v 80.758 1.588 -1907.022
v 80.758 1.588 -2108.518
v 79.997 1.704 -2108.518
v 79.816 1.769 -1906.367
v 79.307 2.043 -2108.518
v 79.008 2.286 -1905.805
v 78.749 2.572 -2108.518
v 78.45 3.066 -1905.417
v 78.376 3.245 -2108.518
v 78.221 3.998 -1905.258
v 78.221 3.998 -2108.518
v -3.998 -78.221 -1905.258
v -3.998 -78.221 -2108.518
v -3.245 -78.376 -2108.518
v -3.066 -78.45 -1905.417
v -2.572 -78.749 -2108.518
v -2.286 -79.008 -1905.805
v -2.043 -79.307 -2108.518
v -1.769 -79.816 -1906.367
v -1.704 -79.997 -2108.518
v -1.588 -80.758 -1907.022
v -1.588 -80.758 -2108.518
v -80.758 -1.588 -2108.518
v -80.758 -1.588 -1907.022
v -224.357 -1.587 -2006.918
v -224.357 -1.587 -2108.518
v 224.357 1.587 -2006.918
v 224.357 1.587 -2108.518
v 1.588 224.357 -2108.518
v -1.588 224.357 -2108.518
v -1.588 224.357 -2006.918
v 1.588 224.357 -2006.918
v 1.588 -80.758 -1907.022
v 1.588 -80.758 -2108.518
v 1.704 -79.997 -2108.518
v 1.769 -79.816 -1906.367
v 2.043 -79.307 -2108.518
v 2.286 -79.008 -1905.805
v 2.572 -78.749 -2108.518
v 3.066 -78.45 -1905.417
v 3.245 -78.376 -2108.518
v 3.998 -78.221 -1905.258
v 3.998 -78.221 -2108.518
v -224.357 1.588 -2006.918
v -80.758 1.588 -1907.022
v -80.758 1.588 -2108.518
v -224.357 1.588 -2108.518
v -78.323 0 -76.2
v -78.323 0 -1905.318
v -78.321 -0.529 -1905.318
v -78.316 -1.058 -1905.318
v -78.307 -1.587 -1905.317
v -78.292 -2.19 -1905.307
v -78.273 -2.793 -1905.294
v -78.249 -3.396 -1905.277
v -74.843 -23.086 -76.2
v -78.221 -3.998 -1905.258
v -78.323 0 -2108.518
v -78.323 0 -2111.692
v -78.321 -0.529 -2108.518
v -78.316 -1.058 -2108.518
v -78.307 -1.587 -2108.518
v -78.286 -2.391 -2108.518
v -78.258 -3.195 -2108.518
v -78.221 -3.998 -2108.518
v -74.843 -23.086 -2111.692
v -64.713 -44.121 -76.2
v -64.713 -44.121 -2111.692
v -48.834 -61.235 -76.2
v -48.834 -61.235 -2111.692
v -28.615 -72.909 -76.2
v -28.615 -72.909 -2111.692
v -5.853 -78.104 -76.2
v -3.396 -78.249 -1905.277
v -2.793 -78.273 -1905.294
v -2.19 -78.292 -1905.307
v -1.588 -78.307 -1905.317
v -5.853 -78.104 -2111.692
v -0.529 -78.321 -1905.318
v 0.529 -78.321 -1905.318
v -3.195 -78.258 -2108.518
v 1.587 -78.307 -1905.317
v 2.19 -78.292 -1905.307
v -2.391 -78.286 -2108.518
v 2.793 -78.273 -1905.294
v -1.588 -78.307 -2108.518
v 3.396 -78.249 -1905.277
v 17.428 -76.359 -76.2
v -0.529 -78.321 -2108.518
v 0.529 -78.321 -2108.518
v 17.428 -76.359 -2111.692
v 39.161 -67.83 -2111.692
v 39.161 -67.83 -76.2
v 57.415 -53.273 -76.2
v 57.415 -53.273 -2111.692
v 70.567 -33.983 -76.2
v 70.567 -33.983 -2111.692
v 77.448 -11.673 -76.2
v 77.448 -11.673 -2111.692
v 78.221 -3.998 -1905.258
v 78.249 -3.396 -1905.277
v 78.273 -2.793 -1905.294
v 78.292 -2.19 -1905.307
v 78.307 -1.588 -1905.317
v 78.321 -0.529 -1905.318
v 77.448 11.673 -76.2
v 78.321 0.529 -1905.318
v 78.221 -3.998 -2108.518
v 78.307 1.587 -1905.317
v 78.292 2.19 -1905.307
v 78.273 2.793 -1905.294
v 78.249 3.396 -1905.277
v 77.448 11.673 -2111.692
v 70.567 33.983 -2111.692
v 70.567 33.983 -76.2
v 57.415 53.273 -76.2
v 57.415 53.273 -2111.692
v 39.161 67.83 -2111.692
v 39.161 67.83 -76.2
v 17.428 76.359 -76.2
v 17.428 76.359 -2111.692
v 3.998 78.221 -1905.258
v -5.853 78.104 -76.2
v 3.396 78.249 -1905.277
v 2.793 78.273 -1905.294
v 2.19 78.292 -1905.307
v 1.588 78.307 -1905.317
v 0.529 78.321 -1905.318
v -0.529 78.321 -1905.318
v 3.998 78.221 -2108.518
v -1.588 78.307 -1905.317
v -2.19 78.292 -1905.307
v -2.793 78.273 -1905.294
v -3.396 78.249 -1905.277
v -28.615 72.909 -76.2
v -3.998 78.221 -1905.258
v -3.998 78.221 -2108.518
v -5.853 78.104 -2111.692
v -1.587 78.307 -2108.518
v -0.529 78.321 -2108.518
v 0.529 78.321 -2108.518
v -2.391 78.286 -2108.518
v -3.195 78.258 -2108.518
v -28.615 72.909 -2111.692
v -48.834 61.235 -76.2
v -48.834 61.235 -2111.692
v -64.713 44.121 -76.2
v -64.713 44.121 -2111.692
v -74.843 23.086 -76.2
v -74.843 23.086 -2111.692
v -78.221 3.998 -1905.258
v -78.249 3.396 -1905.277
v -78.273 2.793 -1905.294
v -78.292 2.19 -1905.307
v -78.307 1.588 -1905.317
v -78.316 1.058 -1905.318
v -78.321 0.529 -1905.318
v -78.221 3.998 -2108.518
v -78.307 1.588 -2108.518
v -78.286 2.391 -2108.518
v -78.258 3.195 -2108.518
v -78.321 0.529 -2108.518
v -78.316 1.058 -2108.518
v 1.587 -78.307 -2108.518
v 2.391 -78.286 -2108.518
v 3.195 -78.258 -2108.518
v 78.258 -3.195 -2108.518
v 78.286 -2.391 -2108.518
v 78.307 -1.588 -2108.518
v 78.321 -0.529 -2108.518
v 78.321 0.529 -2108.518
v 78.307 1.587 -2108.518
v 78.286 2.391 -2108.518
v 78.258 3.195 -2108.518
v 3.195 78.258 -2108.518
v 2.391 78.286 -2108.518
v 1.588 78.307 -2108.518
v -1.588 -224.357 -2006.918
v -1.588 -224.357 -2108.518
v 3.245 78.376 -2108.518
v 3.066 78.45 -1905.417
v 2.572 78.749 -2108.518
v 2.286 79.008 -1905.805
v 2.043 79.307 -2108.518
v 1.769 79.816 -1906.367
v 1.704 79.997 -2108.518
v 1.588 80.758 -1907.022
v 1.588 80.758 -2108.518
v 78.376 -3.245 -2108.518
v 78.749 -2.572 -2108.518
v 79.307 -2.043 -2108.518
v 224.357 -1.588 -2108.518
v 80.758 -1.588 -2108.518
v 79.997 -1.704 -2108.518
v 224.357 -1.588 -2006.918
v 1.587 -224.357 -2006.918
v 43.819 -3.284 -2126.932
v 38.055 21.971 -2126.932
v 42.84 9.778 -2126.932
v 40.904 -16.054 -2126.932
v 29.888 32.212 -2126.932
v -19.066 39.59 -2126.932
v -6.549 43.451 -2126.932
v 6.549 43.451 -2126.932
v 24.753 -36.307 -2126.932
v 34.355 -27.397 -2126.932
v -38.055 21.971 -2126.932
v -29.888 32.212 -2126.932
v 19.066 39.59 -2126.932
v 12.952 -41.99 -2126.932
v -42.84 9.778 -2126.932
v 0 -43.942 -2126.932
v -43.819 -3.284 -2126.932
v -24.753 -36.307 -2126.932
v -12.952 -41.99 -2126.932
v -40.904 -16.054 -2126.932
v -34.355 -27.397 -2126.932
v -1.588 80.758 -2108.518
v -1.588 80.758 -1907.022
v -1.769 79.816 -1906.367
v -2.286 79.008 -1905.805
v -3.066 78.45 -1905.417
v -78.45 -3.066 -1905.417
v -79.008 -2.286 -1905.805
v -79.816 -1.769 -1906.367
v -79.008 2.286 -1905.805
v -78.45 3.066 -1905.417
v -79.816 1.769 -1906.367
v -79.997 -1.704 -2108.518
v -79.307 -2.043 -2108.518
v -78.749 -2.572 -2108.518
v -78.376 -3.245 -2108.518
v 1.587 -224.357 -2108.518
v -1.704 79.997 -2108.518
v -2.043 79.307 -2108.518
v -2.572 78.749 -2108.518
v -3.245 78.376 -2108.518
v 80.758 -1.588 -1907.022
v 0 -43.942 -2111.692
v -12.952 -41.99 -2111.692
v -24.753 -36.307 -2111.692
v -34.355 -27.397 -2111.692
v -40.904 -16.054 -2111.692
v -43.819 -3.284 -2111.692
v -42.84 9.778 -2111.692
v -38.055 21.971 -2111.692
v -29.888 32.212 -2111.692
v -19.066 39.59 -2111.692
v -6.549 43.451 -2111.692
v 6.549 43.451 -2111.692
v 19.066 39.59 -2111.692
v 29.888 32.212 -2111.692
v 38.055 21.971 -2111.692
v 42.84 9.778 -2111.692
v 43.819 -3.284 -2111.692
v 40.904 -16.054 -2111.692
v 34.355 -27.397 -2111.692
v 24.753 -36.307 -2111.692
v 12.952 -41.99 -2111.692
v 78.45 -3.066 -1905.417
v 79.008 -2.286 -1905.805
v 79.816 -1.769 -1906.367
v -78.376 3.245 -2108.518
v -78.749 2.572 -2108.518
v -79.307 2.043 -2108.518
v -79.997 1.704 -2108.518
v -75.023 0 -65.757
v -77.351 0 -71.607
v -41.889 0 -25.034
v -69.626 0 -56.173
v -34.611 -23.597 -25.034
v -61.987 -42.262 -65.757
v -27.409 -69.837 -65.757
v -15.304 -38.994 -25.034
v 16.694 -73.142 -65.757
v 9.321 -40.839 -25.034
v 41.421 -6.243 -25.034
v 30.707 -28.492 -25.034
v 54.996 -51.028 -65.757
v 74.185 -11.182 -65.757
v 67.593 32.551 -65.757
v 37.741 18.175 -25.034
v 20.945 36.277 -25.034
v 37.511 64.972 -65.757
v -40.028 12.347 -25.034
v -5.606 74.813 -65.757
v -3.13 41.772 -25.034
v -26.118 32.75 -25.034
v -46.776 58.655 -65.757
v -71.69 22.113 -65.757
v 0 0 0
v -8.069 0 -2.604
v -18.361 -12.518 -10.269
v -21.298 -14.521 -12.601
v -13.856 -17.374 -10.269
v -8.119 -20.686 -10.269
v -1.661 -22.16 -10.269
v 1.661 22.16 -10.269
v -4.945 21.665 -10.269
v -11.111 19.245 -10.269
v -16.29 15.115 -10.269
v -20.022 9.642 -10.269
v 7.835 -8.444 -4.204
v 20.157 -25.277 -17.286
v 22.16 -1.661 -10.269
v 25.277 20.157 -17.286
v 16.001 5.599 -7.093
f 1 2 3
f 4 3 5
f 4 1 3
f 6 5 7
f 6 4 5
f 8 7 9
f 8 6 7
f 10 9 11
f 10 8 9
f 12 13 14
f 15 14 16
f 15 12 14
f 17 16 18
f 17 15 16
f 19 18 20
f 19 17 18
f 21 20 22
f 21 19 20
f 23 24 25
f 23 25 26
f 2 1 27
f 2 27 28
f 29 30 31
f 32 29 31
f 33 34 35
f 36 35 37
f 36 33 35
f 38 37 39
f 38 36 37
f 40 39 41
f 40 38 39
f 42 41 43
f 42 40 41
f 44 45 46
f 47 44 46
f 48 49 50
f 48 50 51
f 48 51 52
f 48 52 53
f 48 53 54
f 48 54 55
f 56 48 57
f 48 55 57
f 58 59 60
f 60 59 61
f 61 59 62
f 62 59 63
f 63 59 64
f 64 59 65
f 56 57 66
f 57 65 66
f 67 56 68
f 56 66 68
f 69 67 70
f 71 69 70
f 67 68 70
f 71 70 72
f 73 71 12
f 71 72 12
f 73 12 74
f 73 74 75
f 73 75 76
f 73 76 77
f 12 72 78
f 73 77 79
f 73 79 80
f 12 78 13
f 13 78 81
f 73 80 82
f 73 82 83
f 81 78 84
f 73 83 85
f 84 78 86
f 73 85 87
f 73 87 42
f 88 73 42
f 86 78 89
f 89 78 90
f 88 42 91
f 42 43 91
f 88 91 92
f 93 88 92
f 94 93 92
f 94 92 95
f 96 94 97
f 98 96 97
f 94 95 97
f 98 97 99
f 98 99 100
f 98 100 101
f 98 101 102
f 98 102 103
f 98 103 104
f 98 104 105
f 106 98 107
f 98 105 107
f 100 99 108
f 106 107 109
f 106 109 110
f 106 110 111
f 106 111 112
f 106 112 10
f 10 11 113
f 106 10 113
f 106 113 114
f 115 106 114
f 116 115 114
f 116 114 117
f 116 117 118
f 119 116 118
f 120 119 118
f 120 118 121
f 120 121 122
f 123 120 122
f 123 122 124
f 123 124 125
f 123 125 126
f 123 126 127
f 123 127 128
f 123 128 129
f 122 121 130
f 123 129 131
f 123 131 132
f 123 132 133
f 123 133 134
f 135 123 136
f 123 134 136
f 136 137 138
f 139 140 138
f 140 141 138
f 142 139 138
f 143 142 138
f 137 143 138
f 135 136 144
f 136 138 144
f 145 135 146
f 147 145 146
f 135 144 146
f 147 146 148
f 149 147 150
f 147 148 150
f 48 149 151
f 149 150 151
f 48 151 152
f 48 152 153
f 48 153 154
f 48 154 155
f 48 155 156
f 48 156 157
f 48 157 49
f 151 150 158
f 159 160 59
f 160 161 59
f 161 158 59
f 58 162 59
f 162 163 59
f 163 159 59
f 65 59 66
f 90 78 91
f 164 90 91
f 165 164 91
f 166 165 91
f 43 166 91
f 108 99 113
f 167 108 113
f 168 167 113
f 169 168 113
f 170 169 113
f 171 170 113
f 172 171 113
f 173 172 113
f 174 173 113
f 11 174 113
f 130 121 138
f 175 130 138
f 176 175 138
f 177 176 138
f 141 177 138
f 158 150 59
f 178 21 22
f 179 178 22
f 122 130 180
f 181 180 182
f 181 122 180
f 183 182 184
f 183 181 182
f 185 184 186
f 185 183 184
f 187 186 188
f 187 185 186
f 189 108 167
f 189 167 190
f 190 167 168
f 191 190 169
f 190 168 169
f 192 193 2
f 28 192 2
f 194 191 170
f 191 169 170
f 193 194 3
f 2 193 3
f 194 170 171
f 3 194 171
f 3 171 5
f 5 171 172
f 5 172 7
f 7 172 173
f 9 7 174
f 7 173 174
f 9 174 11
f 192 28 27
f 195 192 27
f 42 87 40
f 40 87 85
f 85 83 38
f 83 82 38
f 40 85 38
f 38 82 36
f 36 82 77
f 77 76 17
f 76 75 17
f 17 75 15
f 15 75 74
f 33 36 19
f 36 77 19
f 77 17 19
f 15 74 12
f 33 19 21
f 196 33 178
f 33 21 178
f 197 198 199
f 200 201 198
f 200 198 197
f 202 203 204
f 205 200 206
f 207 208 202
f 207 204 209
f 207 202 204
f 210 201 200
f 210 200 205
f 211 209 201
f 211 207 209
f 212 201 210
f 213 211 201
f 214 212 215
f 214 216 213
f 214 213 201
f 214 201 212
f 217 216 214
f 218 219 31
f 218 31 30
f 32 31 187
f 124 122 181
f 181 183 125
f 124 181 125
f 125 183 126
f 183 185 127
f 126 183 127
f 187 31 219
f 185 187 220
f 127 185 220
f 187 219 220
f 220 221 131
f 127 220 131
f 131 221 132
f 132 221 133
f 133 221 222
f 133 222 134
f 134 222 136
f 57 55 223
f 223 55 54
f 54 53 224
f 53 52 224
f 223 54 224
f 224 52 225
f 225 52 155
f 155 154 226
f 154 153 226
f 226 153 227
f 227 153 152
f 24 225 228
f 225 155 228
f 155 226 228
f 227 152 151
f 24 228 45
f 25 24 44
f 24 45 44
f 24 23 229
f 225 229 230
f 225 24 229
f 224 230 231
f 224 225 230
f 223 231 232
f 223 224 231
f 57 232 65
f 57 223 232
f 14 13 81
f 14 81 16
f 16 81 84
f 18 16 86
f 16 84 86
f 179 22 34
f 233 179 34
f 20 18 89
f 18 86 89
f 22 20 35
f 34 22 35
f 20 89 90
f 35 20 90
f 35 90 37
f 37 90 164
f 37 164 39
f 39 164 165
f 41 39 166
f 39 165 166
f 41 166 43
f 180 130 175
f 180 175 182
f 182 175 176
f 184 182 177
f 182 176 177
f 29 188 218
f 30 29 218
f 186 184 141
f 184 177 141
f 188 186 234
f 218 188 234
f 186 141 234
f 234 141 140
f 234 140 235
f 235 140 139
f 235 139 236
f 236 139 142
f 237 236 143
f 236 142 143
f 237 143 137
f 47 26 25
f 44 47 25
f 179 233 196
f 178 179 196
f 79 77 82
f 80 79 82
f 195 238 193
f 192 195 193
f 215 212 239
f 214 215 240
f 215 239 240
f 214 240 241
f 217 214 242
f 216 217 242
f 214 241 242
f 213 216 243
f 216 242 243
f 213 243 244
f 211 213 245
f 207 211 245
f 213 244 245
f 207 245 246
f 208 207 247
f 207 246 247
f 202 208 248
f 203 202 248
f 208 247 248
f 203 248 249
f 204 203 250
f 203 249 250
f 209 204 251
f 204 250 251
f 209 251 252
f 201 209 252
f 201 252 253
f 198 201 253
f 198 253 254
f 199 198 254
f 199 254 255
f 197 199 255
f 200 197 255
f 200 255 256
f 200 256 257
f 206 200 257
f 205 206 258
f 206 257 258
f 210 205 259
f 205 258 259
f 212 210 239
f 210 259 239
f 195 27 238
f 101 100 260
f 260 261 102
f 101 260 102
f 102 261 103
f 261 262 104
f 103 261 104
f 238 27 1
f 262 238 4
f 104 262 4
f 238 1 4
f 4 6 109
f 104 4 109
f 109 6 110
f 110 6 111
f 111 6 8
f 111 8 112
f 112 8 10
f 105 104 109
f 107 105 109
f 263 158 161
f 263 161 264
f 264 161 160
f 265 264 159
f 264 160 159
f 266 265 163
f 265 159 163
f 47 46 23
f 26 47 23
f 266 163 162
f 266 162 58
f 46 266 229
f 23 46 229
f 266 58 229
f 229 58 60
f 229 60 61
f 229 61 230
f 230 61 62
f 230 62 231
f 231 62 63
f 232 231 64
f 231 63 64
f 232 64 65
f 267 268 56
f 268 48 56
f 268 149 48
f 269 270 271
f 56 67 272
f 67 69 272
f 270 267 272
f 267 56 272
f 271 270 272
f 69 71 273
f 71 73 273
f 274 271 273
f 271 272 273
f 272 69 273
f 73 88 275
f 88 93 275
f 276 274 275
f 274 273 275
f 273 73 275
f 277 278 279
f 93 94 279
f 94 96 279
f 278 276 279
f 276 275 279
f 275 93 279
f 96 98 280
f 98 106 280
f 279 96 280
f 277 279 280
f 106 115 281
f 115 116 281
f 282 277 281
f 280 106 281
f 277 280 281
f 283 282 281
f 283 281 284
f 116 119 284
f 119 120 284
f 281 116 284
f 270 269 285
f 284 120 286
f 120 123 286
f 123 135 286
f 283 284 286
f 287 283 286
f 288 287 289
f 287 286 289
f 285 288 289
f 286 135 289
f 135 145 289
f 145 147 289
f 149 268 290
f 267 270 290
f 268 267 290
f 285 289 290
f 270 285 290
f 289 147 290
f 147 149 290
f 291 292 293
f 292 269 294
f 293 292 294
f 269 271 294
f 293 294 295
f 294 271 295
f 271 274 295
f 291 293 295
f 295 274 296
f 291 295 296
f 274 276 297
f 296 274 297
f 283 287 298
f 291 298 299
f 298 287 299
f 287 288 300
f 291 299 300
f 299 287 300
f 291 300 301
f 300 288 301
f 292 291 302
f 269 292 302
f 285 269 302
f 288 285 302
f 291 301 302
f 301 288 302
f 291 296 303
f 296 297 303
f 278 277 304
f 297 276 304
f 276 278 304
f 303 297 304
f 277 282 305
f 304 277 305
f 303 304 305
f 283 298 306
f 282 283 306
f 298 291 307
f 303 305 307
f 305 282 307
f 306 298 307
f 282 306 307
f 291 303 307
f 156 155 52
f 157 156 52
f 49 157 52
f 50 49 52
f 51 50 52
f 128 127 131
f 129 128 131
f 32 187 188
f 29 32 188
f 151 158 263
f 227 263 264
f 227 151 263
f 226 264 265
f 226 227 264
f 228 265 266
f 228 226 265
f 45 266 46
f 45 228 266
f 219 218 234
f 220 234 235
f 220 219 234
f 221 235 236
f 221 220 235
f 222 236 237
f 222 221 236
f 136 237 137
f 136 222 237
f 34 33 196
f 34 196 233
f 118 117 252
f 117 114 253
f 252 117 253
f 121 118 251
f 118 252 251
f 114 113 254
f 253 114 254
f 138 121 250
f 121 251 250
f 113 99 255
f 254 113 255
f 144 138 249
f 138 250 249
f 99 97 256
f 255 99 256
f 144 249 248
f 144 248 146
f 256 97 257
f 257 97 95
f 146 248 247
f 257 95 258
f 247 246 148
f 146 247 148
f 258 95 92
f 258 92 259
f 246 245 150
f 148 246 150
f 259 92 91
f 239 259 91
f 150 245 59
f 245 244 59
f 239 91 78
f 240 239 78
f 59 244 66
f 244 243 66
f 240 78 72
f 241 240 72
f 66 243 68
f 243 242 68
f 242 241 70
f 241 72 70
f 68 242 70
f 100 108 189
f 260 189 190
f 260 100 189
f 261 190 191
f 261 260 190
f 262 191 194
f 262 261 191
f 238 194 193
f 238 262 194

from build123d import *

# Parameters (mm, degrees)
SKETCH3_R                = 43.942
BOSS_EXTRUDE1_DEPTH      = 15.24
BOSS_EXTRUDE2_REACH      = 2156.162
BOSS_EXTRUDE2_END_RADIUS = 78.322932
SKETCH4_W                = 3.175
SKETCH4_H                = 203.2
CUT_EXTRUDE1_REACH       = 2145.535
FILLET1_R                = 2.54
CIRPATTERN1_COUNT        = 4
FILLET1_OF_CIRPATTERN1_R = 2.54


with BuildPart() as part:
    # Sketch2 → Revolve1 (revolve)
    with BuildSketch(Plane(origin=(0, 0, 0), x_dir=(0, 0, -1), z_dir=(1, 0, 0)), mode=Mode.PRIVATE) as revolve1_sk:
        with BuildLine():
            Line((76.2, 78.322932), (2111.6925, 78.322932))
            Line((2111.6925, 78.322932), (2111.6925, 0))
            Line((2111.6925, 0), (0, 0))
            add(Edge.make_bspline(
                [(0, 0), (0.00157185, 0.031106382), (0.00598179, 0.093218427), (0.019741162, 0.217041654), (0.056245749, 0.471623897), (0.120220676, 0.824555102), (0.289900607, 1.607620967), (0.681695021, 3.044497502), (1.369417811, 5.088592926), (2.663624448, 8.328390532), (4.627219491, 12.504828431), (7.221628503, 17.313832891), (10.478488809, 22.663697626), (14.048468312, 27.97193092), (17.830107282, 33.131203754), (21.803068789, 38.144384751), (25.954684106, 43.010577273), (30.277267993, 47.72553477), (34.76726888, 52.281456881), (39.424593478, 56.666373482), (44.252629149, 60.862995207), (49.25851273, 64.846416869), (54.379271658, 68.526766678), (59.025760285, 71.483086359), (63.137367168, 73.775059871), (66.620488281, 75.459145189), (69.291079417, 76.576884505), (71.652609302, 77.398960624), (73.545502358, 77.917349185), (74.790486934, 78.170322816), (75.589714748, 78.281706661), (75.99027716, 78.31490275), (76.130043485, 78.321823203), (76.2, 78.322932)],
                knots=[0, 0, 0, 0, 0, 0.00110147, 0.00220294, 0.004405879, 0.009096351, 0.013786822, 0.030539543, 0.057061285, 0.08533897, 0.137140357, 0.193696574, 0.250252697, 0.306809175, 0.363365414, 0.419921856, 0.476478205, 0.533034532, 0.589590952, 0.646147292, 0.702703654, 0.75926004, 0.815816409, 0.86911958, 0.89739782, 0.925675959, 0.952619519, 0.971471661, 0.985785918, 0.995050665, 0.997525332, 1, 1, 1, 1, 1], degree=4))
        make_face()
    revolve(revolve1_sk.sketch.rotate(Axis((0, 0, -2111.6925), (0, 0, 1)), 90), axis=Axis((0, 0, -2111.6925), (0, 0, 1)))

    # Sketch3 → Boss-Extrude1 (add)
    with BuildSketch(Plane(origin=(0, 0, -2111.6925), x_dir=(-1, 0, 0), z_dir=(0, 0, -1))):
        with Locations(Location((0, 0, 0), (0, 0, 270))):
            Circle(SKETCH3_R)
    extrude(amount=BOSS_EXTRUDE1_DEPTH)

    # Boss-Extrude2: up to this cylinder (the profile starts outside it)
    boss_extrude2_end = Plane(origin=(0, 0, -2006.9175), z_dir=(0, 0, -1)) * Cylinder(BOSS_EXTRUDE2_END_RADIUS, 4469.969864, mode=Mode.PRIVATE)
    # Sketch4 → Boss-Extrude2 (add, up to the surface)
    with BuildSketch(Plane(origin=(0, 254, 0), x_dir=(1, 0, 0), z_dir=(0, 1, 0)), mode=Mode.PRIVATE) as boss_extrude2_sk1:
        with Locations((0, 2006.9175)):
            Rectangle(SKETCH4_W, SKETCH4_H)
    boss_extrude2_tool1 = extrude(boss_extrude2_sk1.sketch, amount=-BOSS_EXTRUDE2_REACH, mode=Mode.PRIVATE) - boss_extrude2_end
    boss_extrude2 = boss_extrude2_tool1.solids().sort_by_distance((0, 254, -2006.9175))[0]
    add(boss_extrude2)

    # Sketch5 → Cut-Extrude1 (cut, up to next)
    with BuildSketch(Plane.ZY.offset(1.5875), mode=Mode.PRIVATE) as cut_extrude1_sk1:
        Polygon((-2108.5175, 224.356842107), (-2006.9175, 224.356842107), (-1905.3175, 78.306842107), (-1905.3175, 254), (-2108.5175, 254), align=None)
    cut_extrude1_tool1 = extrude(cut_extrude1_sk1.sketch, amount=-CUT_EXTRUDE1_REACH, mode=Mode.PRIVATE) & part.part
    cut_extrude1 = cut_extrude1_tool1.solids().sort_by_distance((-1.5875, 204.128915, -1969.534252))[0]
    add(cut_extrude1, mode=Mode.SUBTRACT)

    # Fillet1
    # the kernel refuses this fillet: 2.54 mm, written as the material it adds along each edge
    with BuildSketch(Plane(origin=(-1.5875, 78.306842107, -1899.190797857), x_dir=(-0.9993639751499004, -0.03566013422001241, 0), z_dir=(0, 0, -1))) as fillet1_piece_1_section:
        with BuildLine():
            CenterArc((2.450992889, 2.539698904), FILLET1_R, 182.043608468, 87.074170625)
            Line((-0.087391608, 2.449122163), (0, 0))
            ThreePointArc((0, 0), (1.205942189, 0.009284527), (2.411884379, 0))
        make_face()
    fillet1_piece_1 = extrude(amount=209.326702143, mode=Mode.PRIVATE)
    fillet1_piece_1 = split(fillet1_piece_1, bisect_by=Plane(origin=(-3.095055571, 78.248638535, -1905.277010558), z_dir=(0, -0.5710644881985995, -0.8209052017854874)), keep=Keep.TOP, mode=Mode.PRIVATE)
    add(fillet1_piece_1)
    with BuildSketch(Plane(origin=(1.5875, 78.306842107, -1899.190797857), x_dir=(0.9993639751499004, -0.035660134220013434, 0), z_dir=(0, 0, -1))) as fillet1_piece_2_section:
        with BuildLine():
            CenterArc((2.450992889, -2.539698904), FILLET1_R, 90.882220907, 87.074170625)
            Line((-0.087391608, -2.449122163), (0, 0))
            ThreePointArc((0, 0), (1.205942189, -0.009284527), (2.411884379, 0))
        make_face()
    fillet1_piece_2 = extrude(amount=209.326702143, mode=Mode.PRIVATE)
    fillet1_piece_2 = split(fillet1_piece_2, bisect_by=Plane(origin=(3.095055571, 78.248638535, -1905.277010558), z_dir=(0, -0.5710644881985995, -0.8209052017854874)), keep=Keep.TOP, mode=Mode.PRIVATE)
    add(fillet1_piece_2)

    # CirPattern1: Boss-Extrude2, Cut-Extrude1 ×4 about axis
    cirpattern1_axis = Axis((0, 0, 0), (0, 0, 1))
    add([boss_extrude2.rotate(cirpattern1_axis, i * 360 / CIRPATTERN1_COUNT) for i in range(1, CIRPATTERN1_COUNT)])
    add([cut_extrude1.rotate(cirpattern1_axis, i * 360 / CIRPATTERN1_COUNT) for i in range(1, CIRPATTERN1_COUNT)], mode=Mode.SUBTRACT)

    # Fillet1 of CirPattern1
    # the kernel refuses this fillet: 2.54 mm, written as the material it adds along each edge
    with BuildSketch(Plane(origin=(-78.306842107, -1.5875, -1899.190797857), x_dir=(0.03566013422001848, -0.9993639751499002, 0), z_dir=(0, 0, -1))) as fillet1_of_cirpattern1_piece_1_section:
        with BuildLine():
            CenterArc((2.450992889, 2.539698904), FILLET1_OF_CIRPATTERN1_R, 182.043608468, 87.074170625)
            Line((-0.087391608, 2.449122163), (0, 0))
            ThreePointArc((0, 0), (1.205942189, 0.009284527), (2.411884379, 0))
        make_face()
    fillet1_of_cirpattern1_piece_1 = extrude(amount=209.326702143, mode=Mode.PRIVATE)
    fillet1_of_cirpattern1_piece_1 = split(fillet1_of_cirpattern1_piece_1, bisect_by=Plane(origin=(-78.248638535, -3.095055571, -1905.277010558), z_dir=(0.5710644881985995, 0, -0.8209052017854874)), keep=Keep.TOP, mode=Mode.PRIVATE)
    add(fillet1_of_cirpattern1_piece_1)
    with BuildSketch(Plane(origin=(-78.306842107, 1.5875, -1899.190797857), x_dir=(0.03566013422001241, 0.9993639751499004, 0), z_dir=(0, 0, -1))) as fillet1_of_cirpattern1_piece_2_section:
        with BuildLine():
            CenterArc((2.450992889, -2.539698904), FILLET1_OF_CIRPATTERN1_R, 90.882220907, 87.074170625)
            Line((-0.087391608, -2.449122163), (0, 0))
            ThreePointArc((0, 0), (1.205942189, -0.009284527), (2.411884379, 0))
        make_face()
    fillet1_of_cirpattern1_piece_2 = extrude(amount=209.326702143, mode=Mode.PRIVATE)
    fillet1_of_cirpattern1_piece_2 = split(fillet1_of_cirpattern1_piece_2, bisect_by=Plane(origin=(-78.248638535, 3.095055571, -1905.277010558), z_dir=(0.5710644881985995, 0, -0.8209052017854874)), keep=Keep.TOP, mode=Mode.PRIVATE)
    add(fillet1_of_cirpattern1_piece_2)
    with BuildSketch(Plane(origin=(1.5875, -78.306842107, -1899.190797857), x_dir=(0.9993639751499002, 0.035660134220018555, 0), z_dir=(0, 0, -1))) as fillet1_of_cirpattern1_piece_3_section:
        with BuildLine():
            CenterArc((2.450992889, 2.539698904), FILLET1_OF_CIRPATTERN1_R, 182.043608468, 87.074170625)
            Line((-0.087391608, 2.449122163), (0, 0))
            ThreePointArc((0, 0), (1.205942189, 0.009284527), (2.411884379, 0))
        make_face()
    fillet1_of_cirpattern1_piece_3 = extrude(amount=209.326702143, mode=Mode.PRIVATE)
    fillet1_of_cirpattern1_piece_3 = split(fillet1_of_cirpattern1_piece_3, bisect_by=Plane(origin=(3.095055571, -78.248638535, -1905.277010558), z_dir=(0, 0.5710644881985995, -0.8209052017854874)), keep=Keep.TOP, mode=Mode.PRIVATE)
    add(fillet1_of_cirpattern1_piece_3)
    with BuildSketch(Plane(origin=(-1.5875, -78.306842107, -1899.190797857), x_dir=(-0.9993639751499004, 0.03566013422001239, 0), z_dir=(0, 0, -1))) as fillet1_of_cirpattern1_piece_4_section:
        with BuildLine():
            CenterArc((2.450992889, -2.539698904), FILLET1_OF_CIRPATTERN1_R, 90.882220907, 87.074170625)
            Line((-0.087391608, -2.449122163), (0, 0))
            ThreePointArc((0, 0), (1.205942189, -0.009284527), (2.411884379, 0))
        make_face()
    fillet1_of_cirpattern1_piece_4 = extrude(amount=209.326702143, mode=Mode.PRIVATE)
    fillet1_of_cirpattern1_piece_4 = split(fillet1_of_cirpattern1_piece_4, bisect_by=Plane(origin=(-3.095055571, -78.248638535, -1905.277010558), z_dir=(0, 0.5710644881985995, -0.8209052017854874)), keep=Keep.TOP, mode=Mode.PRIVATE)
    add(fillet1_of_cirpattern1_piece_4)
    with BuildSketch(Plane(origin=(78.306842107, 1.5875, -1899.190797857), x_dir=(-0.03566013422001829, 0.9993639751499002, 0), z_dir=(0, 0, -1))) as fillet1_of_cirpattern1_piece_5_section:
        with BuildLine():
            CenterArc((2.450992889, 2.539698904), FILLET1_OF_CIRPATTERN1_R, 182.043608468, 87.074170625)
            Line((-0.087391608, 2.449122163), (0, 0))
            ThreePointArc((0, 0), (1.205942189, 0.009284527), (2.411884379, 0))
        make_face()
    fillet1_of_cirpattern1_piece_5 = extrude(amount=209.326702143, mode=Mode.PRIVATE)
    fillet1_of_cirpattern1_piece_5 = split(fillet1_of_cirpattern1_piece_5, bisect_by=Plane(origin=(78.248638535, 3.095055571, -1905.277010558), z_dir=(-0.5710644881985995, 0, -0.8209052017854874)), keep=Keep.TOP, mode=Mode.PRIVATE)
    add(fillet1_of_cirpattern1_piece_5)
    with BuildSketch(Plane(origin=(78.306842107, -1.5875, -1899.190797857), x_dir=(-0.0356601342200124, -0.9993639751499004, 0), z_dir=(0, 0, -1))) as fillet1_of_cirpattern1_piece_6_section:
        with BuildLine():
            CenterArc((2.450992889, -2.539698904), FILLET1_OF_CIRPATTERN1_R, 90.882220907, 87.074170625)
            Line((-0.087391608, -2.449122163), (0, 0))
            ThreePointArc((0, 0), (1.205942189, -0.009284527), (2.411884379, 0))
        make_face()
    fillet1_of_cirpattern1_piece_6 = extrude(amount=209.326702143, mode=Mode.PRIVATE)
    fillet1_of_cirpattern1_piece_6 = split(fillet1_of_cirpattern1_piece_6, bisect_by=Plane(origin=(78.248638535, -3.095055571, -1905.277010558), z_dir=(-0.5710644881985995, 0, -0.8209052017854874)), keep=Keep.TOP, mode=Mode.PRIVATE)
    add(fillet1_of_cirpattern1_piece_6)


solid = part.part
